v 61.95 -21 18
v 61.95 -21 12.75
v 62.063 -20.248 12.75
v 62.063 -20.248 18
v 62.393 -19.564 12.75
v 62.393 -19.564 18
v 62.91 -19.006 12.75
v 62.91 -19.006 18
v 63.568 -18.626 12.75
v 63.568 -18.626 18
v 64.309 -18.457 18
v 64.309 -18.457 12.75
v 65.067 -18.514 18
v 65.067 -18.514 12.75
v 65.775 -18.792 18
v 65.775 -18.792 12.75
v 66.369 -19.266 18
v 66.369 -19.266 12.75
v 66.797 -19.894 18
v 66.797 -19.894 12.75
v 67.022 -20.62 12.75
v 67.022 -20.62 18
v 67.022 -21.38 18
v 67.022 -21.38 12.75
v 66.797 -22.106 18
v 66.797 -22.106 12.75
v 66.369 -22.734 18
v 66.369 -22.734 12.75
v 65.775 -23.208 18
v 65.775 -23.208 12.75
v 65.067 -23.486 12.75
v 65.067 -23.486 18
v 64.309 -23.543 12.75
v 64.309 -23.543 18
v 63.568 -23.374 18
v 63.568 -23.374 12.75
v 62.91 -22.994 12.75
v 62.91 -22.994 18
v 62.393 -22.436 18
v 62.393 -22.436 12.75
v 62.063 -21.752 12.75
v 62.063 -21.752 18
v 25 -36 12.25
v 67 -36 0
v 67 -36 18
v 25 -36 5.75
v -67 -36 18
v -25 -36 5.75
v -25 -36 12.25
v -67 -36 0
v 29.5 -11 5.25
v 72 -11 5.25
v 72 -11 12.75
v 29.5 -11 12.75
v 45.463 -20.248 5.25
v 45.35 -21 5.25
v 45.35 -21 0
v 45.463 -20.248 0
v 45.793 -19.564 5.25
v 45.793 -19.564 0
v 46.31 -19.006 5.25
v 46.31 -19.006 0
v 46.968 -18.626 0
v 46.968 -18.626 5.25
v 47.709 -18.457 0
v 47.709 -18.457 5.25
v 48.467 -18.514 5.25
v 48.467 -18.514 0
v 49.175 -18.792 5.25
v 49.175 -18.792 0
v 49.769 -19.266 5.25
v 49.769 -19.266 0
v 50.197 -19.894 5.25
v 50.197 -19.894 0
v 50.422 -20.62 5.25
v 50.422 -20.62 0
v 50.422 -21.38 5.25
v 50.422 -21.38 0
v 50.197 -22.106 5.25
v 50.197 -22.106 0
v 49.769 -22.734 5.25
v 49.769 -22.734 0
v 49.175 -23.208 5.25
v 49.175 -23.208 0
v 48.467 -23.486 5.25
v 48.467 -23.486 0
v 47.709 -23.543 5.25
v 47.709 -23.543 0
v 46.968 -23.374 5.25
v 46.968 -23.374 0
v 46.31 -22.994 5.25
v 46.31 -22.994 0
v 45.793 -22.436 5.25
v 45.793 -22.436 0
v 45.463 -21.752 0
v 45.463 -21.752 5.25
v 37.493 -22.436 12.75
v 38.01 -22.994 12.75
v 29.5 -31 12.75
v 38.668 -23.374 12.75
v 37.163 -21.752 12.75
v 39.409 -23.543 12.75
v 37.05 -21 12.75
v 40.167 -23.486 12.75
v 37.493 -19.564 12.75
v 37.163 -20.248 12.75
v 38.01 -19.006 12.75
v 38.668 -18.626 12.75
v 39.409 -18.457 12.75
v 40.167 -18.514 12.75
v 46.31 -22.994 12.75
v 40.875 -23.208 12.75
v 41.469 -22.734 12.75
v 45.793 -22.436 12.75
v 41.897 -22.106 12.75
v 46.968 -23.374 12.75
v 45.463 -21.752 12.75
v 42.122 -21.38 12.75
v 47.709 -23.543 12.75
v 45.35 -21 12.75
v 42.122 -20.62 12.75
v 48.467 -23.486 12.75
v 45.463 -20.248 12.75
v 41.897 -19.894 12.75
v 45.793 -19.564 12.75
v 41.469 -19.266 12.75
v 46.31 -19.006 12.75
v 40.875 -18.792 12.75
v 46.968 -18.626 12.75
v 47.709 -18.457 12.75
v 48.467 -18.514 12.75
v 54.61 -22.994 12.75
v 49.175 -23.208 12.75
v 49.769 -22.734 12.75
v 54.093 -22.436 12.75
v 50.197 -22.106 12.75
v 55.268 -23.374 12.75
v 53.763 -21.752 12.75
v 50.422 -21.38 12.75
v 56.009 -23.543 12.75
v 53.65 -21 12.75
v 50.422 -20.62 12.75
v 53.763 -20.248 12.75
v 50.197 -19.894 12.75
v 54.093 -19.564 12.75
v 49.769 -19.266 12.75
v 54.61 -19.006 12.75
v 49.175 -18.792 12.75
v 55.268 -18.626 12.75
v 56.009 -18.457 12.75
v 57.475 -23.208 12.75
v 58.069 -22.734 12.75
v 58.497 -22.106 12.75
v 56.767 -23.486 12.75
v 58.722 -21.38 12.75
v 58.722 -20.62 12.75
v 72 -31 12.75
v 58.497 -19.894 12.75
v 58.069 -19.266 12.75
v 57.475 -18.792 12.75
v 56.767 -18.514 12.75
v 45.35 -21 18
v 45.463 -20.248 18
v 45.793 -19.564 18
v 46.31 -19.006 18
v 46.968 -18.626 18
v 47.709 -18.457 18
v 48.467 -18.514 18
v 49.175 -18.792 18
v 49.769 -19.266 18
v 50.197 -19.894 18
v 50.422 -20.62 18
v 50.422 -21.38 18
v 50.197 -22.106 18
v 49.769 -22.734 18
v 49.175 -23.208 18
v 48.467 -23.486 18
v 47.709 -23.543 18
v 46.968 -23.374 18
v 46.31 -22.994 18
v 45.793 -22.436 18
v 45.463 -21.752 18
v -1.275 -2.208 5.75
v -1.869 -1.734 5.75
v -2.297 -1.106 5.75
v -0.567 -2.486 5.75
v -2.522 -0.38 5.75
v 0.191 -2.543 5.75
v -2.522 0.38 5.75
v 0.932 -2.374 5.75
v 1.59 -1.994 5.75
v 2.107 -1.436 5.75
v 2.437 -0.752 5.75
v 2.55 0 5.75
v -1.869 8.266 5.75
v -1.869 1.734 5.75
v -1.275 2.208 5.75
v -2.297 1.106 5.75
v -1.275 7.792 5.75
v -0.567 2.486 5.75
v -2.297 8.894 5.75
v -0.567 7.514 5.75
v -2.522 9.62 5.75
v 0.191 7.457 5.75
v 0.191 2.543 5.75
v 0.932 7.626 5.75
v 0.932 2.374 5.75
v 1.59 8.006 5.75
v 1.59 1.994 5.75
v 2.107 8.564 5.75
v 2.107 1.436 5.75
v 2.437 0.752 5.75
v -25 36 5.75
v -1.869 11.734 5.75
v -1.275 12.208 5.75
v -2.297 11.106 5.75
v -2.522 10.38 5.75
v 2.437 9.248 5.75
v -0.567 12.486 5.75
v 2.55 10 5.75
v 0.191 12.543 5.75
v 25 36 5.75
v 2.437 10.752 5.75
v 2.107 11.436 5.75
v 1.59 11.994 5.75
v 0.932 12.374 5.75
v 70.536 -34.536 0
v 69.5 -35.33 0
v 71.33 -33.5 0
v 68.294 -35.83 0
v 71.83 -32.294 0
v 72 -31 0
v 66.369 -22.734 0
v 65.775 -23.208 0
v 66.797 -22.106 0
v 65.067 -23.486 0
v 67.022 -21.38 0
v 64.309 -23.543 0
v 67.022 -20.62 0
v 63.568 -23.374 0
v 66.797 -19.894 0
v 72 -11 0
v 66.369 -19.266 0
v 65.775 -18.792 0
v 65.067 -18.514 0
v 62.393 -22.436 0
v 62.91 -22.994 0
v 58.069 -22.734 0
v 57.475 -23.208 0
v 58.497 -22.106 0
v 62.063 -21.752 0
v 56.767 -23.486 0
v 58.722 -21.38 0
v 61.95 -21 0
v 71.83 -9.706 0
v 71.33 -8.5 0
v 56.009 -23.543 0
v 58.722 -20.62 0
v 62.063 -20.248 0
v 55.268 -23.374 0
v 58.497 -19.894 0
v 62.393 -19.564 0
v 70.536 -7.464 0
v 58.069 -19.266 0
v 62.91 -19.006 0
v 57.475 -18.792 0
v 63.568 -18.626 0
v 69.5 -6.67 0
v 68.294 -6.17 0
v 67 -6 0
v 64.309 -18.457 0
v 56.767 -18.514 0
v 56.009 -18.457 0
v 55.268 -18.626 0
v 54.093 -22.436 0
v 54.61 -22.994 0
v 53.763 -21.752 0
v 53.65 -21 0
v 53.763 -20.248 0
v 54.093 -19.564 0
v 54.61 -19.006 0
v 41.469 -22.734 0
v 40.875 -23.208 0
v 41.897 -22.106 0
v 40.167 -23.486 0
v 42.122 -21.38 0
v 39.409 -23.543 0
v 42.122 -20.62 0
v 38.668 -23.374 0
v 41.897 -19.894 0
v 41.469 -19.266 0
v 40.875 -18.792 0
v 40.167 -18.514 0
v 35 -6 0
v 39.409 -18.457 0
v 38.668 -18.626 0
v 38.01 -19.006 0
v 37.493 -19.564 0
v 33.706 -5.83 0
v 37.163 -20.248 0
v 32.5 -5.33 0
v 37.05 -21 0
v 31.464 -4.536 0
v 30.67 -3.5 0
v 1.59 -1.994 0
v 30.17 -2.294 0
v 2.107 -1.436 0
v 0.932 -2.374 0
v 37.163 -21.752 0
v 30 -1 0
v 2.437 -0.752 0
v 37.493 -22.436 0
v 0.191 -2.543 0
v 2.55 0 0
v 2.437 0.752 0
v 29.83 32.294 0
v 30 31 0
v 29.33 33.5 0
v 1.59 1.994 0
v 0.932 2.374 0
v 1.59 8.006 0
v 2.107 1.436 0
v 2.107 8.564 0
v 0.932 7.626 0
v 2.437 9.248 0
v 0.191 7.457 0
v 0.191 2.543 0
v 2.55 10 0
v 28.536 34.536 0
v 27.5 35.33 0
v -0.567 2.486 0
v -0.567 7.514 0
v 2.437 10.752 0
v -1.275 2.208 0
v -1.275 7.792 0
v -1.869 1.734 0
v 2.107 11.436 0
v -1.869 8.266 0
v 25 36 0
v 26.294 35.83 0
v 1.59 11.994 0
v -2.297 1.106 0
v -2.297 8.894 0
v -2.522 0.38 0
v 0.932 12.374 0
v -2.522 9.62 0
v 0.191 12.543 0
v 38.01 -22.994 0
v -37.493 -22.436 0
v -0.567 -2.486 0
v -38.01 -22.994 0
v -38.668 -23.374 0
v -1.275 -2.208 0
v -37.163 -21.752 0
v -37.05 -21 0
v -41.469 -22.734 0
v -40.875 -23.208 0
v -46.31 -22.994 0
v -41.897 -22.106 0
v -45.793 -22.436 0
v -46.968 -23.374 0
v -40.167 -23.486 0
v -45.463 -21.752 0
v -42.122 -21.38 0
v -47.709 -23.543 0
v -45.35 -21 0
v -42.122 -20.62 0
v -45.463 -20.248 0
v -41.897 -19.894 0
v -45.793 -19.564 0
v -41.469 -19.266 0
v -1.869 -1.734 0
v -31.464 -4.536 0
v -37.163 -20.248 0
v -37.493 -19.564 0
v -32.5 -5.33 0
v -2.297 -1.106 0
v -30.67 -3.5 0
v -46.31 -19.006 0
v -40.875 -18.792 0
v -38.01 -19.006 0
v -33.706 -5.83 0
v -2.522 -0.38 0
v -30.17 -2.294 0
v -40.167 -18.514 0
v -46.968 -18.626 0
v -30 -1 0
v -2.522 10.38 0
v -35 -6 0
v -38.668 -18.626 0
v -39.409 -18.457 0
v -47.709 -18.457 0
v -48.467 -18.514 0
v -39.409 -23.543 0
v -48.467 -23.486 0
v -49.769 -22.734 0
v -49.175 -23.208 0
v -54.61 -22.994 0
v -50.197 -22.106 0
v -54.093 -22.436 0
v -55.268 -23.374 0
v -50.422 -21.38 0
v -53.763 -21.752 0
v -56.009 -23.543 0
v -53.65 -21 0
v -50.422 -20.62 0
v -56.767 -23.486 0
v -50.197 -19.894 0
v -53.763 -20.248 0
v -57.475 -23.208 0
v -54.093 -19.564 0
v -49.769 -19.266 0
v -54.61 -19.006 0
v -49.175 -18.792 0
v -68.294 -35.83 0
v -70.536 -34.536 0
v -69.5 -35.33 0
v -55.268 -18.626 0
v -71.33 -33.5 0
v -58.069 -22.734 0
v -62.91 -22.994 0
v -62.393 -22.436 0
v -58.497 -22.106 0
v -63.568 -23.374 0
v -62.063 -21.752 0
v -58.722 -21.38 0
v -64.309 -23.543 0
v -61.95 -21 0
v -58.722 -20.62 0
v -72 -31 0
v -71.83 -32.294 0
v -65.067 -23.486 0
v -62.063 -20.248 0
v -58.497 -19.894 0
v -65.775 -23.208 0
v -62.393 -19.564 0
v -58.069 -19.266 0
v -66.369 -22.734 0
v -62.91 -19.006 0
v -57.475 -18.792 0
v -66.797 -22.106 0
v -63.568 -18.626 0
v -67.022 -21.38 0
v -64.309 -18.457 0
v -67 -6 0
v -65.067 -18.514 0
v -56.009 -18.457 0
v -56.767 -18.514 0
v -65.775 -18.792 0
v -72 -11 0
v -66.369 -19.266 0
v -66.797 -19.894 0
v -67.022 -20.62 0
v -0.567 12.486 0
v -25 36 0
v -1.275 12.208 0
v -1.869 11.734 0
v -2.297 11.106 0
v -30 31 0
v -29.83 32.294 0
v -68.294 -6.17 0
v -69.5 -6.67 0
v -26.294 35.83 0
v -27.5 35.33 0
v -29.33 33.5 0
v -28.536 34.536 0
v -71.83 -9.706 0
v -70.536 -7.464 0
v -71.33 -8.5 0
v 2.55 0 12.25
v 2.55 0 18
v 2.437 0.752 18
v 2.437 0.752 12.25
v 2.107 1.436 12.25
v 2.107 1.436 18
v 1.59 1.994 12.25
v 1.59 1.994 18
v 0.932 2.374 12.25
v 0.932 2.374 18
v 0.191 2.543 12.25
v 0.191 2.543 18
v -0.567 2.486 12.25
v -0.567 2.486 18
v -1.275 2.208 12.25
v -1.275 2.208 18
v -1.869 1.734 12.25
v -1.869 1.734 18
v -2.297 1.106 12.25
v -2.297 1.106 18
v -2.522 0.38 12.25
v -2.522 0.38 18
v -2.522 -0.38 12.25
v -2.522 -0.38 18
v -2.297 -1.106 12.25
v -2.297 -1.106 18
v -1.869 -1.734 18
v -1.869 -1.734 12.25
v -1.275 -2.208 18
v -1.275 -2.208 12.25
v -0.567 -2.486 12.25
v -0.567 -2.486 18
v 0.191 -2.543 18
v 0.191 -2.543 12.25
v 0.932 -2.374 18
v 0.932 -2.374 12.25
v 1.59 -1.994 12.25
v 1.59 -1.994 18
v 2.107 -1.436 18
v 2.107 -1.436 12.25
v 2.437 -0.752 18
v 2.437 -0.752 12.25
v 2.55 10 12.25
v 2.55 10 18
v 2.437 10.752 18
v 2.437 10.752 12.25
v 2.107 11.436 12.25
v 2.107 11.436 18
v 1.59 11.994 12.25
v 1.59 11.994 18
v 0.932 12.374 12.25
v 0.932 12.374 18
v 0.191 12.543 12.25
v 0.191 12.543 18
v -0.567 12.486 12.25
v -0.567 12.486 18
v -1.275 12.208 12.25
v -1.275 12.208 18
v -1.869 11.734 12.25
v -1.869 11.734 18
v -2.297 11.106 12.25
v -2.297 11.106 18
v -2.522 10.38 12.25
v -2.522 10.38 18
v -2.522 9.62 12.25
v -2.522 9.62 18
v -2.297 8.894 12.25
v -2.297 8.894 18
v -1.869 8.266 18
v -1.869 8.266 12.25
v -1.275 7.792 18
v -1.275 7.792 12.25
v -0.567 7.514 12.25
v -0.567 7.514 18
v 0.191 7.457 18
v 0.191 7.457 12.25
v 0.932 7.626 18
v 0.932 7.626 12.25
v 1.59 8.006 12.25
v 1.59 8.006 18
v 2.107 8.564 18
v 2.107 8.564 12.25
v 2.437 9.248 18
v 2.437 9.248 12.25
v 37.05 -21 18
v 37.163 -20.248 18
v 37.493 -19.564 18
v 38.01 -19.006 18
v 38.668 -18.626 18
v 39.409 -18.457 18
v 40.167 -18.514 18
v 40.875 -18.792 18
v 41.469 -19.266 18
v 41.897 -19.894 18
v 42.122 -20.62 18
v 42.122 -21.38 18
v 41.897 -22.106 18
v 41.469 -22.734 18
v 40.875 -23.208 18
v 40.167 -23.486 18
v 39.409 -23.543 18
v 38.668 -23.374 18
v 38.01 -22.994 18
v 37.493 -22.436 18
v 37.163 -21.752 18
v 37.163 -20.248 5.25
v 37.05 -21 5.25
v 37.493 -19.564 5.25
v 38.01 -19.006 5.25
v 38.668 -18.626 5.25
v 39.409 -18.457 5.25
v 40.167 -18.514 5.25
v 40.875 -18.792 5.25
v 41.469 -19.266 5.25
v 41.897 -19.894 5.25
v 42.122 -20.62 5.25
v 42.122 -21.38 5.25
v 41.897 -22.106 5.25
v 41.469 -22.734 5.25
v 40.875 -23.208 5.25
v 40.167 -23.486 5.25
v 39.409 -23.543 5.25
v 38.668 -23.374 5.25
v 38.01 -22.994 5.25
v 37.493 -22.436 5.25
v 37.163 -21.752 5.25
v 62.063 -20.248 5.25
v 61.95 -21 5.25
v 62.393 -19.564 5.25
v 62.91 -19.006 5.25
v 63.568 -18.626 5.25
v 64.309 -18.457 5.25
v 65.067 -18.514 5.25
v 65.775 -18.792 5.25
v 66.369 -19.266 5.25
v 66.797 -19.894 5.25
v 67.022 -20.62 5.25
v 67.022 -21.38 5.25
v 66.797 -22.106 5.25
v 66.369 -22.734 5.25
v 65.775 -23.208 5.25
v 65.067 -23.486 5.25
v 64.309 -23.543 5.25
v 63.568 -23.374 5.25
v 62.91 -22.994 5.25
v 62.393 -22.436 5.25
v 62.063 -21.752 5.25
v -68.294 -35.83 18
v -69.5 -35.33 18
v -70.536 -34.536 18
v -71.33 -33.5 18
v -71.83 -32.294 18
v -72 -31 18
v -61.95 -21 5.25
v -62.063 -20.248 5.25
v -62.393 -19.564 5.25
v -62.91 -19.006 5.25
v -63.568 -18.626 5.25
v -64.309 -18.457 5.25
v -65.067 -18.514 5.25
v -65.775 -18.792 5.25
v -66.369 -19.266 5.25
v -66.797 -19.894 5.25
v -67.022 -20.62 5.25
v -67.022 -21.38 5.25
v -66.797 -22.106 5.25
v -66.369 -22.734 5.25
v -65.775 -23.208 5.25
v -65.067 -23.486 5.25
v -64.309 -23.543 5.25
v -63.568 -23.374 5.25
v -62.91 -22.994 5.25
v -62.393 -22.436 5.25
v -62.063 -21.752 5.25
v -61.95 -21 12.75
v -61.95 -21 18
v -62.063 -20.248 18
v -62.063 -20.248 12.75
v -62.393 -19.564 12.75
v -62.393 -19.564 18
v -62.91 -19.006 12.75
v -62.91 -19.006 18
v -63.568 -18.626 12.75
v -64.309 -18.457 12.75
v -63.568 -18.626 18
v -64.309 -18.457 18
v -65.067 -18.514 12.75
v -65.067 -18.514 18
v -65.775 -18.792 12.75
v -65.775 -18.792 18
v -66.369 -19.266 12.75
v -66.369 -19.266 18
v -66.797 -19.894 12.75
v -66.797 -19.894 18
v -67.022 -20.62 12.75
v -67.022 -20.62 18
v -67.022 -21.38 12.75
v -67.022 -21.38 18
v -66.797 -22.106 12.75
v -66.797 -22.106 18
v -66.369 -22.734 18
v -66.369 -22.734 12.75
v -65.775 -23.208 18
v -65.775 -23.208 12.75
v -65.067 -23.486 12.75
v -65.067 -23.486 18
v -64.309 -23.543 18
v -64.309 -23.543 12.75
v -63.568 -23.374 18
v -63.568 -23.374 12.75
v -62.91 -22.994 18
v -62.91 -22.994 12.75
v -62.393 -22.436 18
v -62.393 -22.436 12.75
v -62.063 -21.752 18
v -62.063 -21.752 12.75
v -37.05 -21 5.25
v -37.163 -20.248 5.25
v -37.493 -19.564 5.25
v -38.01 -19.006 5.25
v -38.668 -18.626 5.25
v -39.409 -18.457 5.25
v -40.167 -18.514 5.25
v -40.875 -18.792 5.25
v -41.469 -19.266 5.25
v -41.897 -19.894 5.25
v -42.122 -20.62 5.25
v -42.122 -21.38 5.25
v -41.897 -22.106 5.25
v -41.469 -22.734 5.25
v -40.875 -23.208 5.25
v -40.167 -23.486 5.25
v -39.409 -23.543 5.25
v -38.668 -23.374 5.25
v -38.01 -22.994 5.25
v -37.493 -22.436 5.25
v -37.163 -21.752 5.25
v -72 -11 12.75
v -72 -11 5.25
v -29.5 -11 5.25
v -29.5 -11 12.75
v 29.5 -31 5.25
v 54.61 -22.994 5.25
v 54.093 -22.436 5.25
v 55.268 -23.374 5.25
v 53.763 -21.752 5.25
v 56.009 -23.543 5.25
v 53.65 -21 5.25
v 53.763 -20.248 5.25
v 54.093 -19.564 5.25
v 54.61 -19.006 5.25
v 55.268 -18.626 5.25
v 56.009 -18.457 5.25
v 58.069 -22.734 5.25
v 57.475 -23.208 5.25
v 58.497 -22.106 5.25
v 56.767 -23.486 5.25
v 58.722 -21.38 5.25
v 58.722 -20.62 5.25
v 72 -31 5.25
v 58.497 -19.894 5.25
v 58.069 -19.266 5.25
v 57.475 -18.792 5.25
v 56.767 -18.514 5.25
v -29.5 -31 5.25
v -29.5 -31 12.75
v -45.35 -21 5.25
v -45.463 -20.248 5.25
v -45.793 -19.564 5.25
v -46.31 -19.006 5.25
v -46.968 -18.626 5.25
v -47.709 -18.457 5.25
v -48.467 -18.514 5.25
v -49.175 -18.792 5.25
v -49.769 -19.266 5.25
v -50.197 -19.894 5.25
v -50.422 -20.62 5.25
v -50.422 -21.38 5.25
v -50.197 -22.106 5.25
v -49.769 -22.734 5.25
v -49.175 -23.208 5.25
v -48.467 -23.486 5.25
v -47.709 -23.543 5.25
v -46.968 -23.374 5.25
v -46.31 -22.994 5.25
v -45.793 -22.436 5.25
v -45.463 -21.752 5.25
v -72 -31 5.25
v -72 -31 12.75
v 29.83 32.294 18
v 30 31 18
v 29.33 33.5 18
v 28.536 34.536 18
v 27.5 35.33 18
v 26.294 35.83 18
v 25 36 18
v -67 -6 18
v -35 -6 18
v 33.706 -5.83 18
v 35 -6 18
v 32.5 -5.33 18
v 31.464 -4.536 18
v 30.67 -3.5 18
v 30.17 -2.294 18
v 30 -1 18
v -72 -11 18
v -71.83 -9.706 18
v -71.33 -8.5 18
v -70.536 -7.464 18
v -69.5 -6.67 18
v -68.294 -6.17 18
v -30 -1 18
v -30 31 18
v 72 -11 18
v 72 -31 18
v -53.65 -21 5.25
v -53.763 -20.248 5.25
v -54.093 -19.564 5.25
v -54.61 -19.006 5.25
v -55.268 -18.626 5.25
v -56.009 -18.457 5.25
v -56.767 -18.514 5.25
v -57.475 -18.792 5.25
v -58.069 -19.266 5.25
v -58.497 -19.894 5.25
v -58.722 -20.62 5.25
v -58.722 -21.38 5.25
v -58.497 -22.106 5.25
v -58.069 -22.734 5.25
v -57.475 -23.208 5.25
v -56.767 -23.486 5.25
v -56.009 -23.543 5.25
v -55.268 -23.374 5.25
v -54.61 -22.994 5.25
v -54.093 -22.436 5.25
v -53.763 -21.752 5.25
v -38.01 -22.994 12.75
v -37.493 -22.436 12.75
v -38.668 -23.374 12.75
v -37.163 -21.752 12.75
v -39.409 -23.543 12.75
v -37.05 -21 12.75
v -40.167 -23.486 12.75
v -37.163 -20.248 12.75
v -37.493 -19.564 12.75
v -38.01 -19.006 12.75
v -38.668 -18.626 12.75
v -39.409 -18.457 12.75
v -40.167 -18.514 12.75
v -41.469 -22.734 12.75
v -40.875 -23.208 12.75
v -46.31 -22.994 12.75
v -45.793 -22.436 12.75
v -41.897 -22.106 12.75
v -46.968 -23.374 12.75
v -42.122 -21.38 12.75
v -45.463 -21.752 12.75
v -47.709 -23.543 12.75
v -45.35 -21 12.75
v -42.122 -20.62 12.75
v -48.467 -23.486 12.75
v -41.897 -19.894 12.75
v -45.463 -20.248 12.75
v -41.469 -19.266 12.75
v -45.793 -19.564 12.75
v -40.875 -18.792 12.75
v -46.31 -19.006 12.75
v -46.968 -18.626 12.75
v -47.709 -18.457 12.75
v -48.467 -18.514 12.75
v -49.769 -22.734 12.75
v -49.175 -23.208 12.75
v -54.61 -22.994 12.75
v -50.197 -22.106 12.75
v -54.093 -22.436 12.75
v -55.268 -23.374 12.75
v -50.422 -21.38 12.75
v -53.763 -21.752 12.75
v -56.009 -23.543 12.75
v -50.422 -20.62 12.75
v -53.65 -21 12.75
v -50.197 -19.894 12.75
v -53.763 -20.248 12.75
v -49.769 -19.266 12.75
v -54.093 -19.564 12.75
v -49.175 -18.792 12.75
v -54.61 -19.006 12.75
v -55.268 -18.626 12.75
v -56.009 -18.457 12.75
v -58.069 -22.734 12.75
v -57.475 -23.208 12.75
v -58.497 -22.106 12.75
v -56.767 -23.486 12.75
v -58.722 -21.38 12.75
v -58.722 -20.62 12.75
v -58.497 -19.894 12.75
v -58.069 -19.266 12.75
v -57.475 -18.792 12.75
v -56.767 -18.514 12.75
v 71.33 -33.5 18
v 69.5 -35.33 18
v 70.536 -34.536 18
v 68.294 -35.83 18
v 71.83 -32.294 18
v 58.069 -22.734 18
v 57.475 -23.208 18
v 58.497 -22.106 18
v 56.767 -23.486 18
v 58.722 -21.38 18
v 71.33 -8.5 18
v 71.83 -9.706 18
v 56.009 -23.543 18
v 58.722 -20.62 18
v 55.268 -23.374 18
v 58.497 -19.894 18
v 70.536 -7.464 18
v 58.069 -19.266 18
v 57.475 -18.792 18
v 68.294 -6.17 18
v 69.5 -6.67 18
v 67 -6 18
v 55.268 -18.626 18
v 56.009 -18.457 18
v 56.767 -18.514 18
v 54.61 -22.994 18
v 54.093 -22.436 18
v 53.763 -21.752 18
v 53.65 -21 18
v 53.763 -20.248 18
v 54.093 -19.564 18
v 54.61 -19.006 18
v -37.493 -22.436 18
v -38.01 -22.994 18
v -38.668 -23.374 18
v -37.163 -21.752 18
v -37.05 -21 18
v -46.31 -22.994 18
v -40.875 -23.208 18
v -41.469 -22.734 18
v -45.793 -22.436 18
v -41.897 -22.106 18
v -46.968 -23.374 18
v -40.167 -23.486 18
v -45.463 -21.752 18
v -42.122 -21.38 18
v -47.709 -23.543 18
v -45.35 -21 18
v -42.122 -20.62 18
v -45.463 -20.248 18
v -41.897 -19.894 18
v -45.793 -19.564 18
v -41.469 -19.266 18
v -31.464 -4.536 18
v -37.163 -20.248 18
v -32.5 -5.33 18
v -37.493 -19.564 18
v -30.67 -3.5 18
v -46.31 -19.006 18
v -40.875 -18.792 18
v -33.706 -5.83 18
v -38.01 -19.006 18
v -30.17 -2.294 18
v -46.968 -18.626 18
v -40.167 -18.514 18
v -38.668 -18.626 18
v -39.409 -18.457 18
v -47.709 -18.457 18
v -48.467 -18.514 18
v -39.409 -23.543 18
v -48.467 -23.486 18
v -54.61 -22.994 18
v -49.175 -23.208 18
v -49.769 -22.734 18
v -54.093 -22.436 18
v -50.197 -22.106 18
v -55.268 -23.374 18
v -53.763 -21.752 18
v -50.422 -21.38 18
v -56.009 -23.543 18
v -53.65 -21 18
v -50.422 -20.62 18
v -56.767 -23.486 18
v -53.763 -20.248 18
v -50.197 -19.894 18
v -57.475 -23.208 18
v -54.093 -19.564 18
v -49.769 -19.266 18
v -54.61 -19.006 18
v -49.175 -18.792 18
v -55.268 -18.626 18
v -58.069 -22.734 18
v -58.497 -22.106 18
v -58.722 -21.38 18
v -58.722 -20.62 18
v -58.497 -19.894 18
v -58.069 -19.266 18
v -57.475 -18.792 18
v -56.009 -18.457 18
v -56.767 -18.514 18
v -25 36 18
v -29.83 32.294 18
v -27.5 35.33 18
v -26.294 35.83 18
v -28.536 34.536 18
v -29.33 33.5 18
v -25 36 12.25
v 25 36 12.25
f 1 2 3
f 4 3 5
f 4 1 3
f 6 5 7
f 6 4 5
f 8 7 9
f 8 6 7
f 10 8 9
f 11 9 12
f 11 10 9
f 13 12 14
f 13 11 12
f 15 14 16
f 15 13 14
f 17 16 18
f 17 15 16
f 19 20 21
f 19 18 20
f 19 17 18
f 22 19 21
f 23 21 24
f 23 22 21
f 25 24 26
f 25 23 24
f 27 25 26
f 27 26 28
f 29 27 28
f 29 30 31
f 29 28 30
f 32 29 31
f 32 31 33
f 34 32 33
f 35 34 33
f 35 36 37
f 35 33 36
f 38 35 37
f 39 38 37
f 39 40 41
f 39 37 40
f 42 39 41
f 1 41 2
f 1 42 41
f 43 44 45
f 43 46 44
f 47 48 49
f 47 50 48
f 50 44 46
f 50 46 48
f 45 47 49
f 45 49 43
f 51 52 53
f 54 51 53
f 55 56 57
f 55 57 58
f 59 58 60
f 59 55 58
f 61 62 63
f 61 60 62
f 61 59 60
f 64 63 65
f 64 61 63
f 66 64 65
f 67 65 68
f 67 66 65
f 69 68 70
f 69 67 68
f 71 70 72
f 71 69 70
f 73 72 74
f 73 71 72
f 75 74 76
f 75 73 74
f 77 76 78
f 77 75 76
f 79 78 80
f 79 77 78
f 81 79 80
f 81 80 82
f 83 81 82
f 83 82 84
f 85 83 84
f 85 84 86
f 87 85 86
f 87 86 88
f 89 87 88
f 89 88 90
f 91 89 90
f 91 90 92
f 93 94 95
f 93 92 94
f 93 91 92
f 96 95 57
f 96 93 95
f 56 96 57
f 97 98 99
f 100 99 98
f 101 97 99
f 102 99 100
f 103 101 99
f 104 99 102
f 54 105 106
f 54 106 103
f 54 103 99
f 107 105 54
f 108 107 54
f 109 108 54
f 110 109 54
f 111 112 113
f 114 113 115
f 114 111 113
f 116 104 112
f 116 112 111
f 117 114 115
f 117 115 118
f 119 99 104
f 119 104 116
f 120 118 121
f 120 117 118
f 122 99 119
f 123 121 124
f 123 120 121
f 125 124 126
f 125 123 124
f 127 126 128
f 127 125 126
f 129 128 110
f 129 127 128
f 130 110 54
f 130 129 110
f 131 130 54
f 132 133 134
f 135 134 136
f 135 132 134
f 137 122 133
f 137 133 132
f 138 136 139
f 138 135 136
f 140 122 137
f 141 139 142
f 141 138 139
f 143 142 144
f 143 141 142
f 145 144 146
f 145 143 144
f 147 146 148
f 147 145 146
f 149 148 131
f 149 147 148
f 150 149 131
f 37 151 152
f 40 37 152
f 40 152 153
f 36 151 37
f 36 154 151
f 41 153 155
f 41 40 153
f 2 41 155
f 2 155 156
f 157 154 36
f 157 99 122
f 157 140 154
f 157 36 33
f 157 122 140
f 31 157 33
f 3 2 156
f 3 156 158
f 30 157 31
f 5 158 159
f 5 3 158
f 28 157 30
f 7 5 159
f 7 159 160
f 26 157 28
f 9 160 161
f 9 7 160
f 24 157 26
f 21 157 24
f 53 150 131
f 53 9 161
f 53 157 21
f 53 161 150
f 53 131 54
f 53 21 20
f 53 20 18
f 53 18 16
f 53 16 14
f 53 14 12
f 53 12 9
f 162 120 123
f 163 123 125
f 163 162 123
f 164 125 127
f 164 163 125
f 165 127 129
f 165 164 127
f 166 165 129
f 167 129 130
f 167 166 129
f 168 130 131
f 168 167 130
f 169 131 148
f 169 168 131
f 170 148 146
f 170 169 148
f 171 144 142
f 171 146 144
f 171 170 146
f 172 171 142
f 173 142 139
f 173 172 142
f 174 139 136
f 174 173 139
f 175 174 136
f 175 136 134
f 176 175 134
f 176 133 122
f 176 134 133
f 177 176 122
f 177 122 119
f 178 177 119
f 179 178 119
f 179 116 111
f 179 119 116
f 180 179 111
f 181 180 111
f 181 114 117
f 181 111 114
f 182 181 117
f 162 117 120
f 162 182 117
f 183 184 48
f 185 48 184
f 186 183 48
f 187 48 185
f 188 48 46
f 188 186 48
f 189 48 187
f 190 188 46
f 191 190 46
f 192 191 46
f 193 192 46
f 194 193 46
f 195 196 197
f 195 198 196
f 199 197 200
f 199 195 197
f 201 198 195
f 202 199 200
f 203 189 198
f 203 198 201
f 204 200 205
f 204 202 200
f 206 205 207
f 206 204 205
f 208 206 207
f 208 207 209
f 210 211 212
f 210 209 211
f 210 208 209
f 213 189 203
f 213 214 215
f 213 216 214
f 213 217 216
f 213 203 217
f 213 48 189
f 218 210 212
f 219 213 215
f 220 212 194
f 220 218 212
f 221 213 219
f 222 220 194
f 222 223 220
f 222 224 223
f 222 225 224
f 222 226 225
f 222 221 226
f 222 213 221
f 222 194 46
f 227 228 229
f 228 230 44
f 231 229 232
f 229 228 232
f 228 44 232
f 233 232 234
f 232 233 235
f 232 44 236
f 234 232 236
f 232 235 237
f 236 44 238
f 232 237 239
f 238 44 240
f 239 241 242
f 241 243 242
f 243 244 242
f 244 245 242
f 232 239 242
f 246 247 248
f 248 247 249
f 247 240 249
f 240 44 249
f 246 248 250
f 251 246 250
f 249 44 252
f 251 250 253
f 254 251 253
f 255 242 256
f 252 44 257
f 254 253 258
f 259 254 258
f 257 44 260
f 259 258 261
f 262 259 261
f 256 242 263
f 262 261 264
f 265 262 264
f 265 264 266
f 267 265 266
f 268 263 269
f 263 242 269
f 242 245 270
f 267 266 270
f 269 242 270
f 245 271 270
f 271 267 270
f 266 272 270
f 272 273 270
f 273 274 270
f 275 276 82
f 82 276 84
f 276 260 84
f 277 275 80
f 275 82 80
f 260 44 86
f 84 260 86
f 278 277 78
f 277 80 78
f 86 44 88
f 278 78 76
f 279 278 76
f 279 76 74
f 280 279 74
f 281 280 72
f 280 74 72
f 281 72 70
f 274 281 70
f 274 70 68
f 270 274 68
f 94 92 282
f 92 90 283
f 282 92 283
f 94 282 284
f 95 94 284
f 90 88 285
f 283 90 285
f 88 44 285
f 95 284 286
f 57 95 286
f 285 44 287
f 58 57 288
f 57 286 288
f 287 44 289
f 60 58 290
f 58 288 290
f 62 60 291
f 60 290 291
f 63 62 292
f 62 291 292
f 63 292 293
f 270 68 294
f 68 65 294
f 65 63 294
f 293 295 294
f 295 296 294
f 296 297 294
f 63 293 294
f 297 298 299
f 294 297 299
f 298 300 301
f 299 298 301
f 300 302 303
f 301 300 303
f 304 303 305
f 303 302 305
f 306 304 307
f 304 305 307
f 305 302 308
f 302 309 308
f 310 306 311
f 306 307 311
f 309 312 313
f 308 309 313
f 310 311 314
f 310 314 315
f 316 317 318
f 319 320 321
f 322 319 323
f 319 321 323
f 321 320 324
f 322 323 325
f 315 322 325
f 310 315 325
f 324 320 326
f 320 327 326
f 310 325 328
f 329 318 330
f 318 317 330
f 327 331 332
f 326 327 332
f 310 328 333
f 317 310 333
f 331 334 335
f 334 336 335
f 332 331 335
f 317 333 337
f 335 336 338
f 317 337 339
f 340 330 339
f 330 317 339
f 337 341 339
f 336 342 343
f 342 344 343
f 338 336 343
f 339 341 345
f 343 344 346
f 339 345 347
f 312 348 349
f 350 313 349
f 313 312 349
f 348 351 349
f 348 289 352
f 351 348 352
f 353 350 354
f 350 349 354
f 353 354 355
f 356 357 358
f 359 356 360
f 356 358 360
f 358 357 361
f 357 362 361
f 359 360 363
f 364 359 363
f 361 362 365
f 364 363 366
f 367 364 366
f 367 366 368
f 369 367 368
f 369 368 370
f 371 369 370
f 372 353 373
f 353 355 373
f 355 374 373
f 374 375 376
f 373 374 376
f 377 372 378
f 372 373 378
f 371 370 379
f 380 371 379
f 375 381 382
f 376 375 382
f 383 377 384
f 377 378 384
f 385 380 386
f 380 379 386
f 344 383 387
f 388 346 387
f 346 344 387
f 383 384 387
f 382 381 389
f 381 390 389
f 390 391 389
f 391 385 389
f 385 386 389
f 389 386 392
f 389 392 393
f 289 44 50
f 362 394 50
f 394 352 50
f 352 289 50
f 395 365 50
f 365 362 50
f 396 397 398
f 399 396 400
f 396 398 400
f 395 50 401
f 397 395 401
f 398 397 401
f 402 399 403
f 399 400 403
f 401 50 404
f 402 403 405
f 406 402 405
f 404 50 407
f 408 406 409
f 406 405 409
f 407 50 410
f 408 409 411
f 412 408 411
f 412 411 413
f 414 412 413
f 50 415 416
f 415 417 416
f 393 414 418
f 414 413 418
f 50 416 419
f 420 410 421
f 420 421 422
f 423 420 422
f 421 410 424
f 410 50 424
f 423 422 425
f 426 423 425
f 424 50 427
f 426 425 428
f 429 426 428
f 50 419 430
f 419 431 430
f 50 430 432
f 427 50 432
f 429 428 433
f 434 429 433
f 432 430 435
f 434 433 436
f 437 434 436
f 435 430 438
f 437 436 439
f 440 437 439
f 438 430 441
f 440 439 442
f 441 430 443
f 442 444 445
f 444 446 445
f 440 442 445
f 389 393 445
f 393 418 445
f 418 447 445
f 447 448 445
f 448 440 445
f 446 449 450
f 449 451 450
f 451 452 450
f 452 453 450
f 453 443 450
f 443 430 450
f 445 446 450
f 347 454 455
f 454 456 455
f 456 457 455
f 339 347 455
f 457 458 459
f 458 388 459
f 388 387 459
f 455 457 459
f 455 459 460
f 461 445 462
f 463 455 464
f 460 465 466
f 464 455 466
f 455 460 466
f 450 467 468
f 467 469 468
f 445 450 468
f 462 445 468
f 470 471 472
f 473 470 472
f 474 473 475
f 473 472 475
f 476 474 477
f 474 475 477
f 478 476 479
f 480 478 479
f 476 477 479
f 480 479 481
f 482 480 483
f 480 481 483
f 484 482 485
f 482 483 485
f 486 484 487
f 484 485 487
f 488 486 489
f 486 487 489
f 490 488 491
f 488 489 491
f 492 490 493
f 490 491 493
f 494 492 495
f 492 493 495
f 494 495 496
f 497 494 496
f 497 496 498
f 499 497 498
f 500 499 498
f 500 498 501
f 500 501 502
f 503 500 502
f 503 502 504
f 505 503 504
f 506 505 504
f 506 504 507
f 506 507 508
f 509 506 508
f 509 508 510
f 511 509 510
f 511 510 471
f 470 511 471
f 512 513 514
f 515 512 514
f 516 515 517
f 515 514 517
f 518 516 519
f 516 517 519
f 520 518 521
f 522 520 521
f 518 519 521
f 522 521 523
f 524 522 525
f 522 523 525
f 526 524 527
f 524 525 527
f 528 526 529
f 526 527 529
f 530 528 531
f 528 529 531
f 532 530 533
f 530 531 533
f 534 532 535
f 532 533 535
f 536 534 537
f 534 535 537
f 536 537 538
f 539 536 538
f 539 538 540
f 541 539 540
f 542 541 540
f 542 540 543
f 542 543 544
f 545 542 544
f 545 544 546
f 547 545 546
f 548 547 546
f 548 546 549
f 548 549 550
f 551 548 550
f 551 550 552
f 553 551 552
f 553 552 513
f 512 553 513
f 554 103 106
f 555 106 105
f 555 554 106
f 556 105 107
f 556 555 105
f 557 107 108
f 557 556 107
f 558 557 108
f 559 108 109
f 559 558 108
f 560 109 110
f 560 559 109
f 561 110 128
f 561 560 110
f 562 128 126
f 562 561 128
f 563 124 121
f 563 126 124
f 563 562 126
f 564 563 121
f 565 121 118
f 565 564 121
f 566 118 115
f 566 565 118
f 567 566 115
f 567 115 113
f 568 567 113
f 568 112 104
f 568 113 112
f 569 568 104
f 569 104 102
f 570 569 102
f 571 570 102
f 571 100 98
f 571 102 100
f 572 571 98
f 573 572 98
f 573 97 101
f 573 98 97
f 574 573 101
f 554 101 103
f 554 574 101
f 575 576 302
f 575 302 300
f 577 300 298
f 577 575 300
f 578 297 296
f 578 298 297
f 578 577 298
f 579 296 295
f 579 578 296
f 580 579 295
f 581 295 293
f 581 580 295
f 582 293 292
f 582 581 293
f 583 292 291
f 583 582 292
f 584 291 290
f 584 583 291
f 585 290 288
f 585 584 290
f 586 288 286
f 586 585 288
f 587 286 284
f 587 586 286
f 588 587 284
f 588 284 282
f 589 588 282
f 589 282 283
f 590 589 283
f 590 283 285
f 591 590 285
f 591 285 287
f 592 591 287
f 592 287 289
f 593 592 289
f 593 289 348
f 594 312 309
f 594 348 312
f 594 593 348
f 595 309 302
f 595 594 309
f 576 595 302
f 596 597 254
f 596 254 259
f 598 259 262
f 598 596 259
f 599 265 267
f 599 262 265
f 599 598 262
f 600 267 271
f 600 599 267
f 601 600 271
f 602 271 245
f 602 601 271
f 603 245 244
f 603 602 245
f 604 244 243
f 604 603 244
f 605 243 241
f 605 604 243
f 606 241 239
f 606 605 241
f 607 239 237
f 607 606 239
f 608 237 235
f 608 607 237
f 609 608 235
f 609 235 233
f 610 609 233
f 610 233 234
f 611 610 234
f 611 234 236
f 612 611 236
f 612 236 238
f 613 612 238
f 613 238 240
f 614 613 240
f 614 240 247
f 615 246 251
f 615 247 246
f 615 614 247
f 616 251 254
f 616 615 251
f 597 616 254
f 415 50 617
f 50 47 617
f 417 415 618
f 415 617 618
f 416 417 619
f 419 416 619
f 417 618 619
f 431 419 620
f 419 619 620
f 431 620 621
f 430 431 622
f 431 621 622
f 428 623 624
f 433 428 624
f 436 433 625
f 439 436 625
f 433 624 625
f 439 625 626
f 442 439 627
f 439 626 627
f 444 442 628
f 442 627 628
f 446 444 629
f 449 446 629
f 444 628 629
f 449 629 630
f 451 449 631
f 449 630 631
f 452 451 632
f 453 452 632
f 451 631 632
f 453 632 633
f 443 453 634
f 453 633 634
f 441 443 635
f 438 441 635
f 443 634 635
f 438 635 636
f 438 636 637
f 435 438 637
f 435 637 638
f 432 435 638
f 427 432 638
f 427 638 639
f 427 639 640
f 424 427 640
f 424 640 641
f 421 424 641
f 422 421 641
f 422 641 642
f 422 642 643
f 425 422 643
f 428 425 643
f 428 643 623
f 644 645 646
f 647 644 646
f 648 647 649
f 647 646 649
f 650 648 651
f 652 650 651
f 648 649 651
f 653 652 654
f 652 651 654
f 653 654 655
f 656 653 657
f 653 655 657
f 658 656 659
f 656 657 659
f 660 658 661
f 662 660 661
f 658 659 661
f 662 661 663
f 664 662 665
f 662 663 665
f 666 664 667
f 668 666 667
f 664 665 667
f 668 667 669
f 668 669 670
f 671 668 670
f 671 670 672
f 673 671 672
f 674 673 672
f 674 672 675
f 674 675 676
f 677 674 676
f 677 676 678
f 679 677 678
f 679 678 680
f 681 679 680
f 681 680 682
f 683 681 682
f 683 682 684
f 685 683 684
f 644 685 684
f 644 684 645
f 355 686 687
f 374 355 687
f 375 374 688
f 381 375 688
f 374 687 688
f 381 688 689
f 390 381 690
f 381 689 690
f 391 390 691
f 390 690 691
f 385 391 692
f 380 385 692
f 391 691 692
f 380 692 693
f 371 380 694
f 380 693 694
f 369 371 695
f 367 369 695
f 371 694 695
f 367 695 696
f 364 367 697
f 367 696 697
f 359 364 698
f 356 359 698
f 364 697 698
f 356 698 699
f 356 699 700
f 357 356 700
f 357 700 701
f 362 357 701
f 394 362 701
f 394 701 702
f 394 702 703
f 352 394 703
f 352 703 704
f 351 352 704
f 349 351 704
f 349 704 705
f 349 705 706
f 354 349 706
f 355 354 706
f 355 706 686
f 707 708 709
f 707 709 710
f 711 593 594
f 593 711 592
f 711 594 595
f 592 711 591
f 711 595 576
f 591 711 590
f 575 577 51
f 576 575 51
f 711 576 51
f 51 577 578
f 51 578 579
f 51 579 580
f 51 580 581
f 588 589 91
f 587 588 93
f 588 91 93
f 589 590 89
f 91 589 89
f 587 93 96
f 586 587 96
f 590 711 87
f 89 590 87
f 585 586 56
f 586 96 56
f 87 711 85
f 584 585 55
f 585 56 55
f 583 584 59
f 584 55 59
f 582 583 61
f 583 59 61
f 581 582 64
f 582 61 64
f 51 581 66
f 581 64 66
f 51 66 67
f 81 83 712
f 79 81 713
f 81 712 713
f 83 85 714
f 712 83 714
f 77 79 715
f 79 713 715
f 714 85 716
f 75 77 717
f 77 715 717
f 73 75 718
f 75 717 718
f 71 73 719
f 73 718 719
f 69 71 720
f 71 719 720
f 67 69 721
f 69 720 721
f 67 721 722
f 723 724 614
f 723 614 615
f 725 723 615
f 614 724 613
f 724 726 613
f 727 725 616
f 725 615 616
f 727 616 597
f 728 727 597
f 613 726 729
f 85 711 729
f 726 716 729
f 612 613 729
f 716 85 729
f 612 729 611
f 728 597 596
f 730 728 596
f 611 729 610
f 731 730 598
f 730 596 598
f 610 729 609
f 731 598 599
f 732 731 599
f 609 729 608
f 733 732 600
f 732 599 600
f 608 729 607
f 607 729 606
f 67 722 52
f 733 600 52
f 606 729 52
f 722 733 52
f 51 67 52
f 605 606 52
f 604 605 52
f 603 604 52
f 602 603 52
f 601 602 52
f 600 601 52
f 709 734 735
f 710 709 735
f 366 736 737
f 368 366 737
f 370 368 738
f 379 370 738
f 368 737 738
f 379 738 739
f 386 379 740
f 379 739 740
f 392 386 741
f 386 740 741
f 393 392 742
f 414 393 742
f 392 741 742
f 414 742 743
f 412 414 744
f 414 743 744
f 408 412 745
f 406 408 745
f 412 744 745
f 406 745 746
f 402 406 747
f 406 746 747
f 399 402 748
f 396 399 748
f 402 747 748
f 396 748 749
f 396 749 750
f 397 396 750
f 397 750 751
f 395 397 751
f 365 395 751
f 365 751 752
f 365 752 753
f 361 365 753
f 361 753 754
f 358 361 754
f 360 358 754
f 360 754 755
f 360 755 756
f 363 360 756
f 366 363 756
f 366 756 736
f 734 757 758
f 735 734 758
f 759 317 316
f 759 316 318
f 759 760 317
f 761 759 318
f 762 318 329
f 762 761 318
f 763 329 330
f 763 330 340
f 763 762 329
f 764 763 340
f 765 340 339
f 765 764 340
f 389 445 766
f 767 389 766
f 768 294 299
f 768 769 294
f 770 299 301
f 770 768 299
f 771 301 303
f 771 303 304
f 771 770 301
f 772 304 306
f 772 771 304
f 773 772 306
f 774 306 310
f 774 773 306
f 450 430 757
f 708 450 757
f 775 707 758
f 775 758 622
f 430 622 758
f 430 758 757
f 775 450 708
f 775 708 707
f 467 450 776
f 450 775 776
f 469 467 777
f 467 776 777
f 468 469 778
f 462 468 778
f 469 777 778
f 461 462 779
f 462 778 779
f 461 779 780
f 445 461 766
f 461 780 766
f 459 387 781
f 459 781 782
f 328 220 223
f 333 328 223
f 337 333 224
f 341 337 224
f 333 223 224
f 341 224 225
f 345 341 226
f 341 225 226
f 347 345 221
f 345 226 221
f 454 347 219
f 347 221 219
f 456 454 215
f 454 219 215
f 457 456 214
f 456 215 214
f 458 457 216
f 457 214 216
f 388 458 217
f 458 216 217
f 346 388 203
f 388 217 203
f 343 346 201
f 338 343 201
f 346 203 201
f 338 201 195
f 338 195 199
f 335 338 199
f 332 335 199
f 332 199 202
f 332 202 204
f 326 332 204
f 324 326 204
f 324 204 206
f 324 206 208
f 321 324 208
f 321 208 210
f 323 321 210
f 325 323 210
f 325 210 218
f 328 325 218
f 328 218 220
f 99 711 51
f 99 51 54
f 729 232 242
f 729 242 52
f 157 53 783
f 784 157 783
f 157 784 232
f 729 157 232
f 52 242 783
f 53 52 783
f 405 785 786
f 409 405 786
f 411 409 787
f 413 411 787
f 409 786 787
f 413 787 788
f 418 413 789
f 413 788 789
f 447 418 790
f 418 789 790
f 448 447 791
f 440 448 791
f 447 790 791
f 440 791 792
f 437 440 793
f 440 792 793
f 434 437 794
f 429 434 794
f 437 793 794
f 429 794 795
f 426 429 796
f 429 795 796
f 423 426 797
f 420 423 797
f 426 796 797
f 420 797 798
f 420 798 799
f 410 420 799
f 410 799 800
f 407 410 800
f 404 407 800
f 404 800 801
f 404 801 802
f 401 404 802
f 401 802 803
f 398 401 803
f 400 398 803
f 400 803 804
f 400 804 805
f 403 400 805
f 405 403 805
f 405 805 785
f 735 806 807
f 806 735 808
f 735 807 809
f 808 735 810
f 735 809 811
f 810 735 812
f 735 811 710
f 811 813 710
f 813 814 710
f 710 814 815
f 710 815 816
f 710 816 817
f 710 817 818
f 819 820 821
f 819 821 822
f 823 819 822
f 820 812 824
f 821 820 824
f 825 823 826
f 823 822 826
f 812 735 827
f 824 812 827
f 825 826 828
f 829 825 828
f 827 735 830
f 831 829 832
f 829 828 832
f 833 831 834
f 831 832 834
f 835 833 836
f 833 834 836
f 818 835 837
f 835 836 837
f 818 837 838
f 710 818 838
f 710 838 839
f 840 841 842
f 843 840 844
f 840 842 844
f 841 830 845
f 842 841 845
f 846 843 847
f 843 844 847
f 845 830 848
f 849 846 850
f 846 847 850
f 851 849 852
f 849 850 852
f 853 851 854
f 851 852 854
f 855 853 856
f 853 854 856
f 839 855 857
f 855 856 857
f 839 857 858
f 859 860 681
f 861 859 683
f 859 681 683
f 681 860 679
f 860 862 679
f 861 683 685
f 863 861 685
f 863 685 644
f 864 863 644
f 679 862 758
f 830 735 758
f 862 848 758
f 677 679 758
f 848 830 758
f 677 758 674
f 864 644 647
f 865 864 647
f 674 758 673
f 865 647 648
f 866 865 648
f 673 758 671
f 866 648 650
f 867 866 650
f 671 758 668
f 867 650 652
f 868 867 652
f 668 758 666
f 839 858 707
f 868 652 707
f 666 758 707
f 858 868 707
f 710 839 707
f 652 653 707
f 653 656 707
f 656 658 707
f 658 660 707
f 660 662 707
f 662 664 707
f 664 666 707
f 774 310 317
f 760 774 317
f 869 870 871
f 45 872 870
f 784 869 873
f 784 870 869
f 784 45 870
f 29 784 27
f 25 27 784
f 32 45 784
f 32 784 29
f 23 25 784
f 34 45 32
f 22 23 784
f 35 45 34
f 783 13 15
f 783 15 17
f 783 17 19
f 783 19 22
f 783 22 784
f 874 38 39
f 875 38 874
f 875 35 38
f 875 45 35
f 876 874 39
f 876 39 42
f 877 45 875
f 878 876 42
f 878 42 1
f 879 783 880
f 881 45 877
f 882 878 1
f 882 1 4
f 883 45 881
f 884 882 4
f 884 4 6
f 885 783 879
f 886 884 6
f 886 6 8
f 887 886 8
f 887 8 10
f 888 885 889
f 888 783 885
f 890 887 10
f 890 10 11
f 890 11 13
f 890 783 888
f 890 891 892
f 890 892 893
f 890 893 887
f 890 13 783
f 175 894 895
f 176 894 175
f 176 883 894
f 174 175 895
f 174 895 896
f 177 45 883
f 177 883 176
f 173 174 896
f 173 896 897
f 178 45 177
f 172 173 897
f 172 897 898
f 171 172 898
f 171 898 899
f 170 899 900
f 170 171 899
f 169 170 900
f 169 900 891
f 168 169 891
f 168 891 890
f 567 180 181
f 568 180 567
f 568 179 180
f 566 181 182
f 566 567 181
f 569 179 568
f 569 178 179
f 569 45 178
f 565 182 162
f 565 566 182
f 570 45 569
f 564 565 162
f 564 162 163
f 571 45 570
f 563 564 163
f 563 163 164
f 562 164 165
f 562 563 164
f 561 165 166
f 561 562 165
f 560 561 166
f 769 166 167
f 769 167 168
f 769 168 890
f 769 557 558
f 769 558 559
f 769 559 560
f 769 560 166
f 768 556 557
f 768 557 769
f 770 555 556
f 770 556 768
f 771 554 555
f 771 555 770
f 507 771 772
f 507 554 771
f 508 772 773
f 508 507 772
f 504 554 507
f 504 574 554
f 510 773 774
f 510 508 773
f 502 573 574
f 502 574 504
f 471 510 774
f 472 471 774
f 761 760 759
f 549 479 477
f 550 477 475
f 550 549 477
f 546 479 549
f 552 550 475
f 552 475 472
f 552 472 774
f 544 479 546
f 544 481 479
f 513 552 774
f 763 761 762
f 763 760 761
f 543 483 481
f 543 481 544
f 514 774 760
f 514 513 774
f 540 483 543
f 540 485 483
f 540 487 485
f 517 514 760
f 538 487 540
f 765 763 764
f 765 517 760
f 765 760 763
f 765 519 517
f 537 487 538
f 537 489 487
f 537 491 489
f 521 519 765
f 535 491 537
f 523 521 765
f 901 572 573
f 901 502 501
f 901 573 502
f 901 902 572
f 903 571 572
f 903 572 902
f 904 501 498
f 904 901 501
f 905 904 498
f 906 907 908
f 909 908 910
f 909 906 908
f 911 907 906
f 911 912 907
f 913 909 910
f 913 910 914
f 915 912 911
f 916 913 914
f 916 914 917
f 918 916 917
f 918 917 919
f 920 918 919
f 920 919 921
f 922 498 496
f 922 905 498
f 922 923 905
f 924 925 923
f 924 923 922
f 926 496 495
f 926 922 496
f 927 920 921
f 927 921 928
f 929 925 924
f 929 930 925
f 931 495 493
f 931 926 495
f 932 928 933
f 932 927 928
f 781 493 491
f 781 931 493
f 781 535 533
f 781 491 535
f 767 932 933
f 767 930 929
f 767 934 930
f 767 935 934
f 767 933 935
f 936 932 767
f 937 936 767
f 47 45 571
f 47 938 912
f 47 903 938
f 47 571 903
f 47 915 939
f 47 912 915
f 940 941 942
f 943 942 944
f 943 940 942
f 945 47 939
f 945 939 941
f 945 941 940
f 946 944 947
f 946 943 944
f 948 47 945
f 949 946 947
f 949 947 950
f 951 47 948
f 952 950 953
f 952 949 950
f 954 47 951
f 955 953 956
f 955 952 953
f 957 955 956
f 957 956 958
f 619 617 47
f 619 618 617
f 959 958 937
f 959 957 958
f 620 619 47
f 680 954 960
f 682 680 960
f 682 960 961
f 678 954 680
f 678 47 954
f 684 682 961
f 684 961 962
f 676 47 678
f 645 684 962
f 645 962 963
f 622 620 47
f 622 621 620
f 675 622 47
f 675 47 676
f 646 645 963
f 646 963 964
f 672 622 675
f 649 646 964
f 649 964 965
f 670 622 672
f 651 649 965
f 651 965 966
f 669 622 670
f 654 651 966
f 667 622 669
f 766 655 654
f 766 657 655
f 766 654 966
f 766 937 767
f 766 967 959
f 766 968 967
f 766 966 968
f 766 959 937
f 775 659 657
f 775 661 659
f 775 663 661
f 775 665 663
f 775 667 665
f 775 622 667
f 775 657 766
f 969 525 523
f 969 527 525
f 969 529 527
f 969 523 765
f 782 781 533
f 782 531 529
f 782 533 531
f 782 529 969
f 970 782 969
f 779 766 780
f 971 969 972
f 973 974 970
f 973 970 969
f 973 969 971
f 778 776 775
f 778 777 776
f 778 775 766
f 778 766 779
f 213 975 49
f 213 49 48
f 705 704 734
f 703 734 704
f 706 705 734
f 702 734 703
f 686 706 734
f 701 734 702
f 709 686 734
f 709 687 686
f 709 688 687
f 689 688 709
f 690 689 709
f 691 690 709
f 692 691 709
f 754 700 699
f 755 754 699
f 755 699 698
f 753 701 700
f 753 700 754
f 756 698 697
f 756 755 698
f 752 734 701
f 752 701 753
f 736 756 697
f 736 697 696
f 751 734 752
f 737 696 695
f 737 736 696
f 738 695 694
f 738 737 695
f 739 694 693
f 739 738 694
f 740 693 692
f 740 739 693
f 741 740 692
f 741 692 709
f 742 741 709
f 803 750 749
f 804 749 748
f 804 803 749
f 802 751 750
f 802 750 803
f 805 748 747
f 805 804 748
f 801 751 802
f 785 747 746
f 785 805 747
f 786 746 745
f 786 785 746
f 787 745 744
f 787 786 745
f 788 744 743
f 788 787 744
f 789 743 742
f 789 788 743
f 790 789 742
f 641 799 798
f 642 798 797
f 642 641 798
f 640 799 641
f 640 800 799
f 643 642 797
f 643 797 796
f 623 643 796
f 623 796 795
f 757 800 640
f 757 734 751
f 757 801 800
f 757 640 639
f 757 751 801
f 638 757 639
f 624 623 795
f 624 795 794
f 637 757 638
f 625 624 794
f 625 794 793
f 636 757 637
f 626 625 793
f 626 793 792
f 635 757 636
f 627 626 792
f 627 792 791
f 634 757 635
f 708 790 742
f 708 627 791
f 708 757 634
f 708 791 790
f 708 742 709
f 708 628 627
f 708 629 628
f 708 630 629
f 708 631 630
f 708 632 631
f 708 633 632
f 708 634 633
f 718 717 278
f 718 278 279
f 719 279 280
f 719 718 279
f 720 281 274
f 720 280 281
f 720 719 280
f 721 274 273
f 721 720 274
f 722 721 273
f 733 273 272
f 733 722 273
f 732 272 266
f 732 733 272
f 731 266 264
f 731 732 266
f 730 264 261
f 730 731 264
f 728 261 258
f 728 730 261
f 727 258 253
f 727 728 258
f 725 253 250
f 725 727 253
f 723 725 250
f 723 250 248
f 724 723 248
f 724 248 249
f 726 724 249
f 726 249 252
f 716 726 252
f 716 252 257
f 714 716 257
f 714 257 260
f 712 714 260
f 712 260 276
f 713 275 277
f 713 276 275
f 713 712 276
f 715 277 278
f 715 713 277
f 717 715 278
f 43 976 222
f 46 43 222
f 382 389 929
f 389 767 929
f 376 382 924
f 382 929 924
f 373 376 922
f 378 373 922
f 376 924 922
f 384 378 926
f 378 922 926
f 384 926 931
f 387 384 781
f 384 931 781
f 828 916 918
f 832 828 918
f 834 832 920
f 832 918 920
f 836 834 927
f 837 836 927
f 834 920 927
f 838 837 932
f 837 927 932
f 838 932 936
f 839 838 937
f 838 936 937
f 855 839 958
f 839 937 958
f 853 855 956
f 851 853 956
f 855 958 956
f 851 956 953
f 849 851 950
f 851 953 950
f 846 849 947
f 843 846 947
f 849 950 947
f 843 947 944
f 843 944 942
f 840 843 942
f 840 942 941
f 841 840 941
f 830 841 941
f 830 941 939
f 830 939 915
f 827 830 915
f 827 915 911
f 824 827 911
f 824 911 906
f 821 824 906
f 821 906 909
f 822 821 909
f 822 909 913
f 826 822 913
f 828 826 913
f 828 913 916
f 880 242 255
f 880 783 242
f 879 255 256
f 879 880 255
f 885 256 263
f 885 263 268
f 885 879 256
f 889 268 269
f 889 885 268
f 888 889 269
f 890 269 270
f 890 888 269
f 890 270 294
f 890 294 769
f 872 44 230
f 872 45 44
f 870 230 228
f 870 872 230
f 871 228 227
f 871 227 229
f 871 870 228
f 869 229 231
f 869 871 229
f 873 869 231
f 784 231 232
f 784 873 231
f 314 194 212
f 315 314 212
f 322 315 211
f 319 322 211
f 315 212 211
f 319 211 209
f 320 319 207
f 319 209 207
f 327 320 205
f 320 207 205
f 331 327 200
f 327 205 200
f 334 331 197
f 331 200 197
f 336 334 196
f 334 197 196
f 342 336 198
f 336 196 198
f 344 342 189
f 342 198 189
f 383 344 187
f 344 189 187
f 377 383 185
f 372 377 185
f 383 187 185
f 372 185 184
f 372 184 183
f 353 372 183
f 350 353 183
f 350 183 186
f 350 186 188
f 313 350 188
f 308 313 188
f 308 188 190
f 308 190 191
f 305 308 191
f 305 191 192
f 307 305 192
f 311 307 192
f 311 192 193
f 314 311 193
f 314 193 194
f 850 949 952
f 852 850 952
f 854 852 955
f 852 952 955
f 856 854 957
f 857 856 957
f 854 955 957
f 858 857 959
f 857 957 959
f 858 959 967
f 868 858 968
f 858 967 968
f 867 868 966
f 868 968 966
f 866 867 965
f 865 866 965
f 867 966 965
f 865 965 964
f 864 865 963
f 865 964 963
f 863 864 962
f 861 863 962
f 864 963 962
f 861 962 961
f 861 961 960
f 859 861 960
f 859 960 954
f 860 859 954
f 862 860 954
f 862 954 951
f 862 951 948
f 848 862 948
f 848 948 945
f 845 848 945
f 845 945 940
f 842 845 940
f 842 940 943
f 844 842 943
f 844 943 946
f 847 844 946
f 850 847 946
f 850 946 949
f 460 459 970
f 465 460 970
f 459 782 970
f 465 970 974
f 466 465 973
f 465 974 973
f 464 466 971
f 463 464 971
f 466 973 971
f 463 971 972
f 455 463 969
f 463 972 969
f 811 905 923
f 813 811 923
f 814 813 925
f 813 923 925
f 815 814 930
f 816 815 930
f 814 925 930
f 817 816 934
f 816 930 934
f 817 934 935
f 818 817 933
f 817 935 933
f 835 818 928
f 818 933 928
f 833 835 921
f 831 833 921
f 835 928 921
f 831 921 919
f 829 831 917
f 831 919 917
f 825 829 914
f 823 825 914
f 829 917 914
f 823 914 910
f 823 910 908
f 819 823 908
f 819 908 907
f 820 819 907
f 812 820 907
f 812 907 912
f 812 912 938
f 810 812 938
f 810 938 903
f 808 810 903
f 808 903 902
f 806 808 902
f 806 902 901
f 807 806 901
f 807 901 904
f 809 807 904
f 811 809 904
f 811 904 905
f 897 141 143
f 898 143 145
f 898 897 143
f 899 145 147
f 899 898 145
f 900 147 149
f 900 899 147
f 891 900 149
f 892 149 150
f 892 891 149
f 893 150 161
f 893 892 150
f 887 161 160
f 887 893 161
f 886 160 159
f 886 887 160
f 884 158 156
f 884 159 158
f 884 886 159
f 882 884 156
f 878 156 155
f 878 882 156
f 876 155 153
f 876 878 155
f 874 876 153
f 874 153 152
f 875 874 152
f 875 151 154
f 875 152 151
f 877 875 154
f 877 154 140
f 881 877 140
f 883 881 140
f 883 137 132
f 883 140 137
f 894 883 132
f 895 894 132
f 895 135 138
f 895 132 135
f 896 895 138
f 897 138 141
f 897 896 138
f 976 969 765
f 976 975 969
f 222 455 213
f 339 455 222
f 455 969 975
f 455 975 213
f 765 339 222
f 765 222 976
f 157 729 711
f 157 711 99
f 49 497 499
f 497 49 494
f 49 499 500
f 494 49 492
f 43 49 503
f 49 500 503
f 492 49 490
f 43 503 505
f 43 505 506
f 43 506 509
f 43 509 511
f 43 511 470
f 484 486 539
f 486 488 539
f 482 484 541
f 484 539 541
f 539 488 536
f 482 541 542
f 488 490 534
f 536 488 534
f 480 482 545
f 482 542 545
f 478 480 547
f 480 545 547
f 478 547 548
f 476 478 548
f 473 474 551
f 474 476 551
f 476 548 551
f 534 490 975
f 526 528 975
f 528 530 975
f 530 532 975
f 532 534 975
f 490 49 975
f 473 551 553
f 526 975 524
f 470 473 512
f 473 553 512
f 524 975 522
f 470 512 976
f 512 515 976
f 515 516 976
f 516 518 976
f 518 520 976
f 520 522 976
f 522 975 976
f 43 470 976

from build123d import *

# Parameters (mm, degrees)
SKETCH1_W           = 60
SKETCH1_H           = 72
BOSS_EXTRUDE1_DEPTH = 18
SKETCH2_W           = 50
SKETCH2_H           = 6.5
CUT_EXTRUDE1_DEPTH  = 81.049984385
SKETCH3_W           = 18
SKETCH3_H           = 30
BOSS_EXTRUDE2_DEPTH = 42
SKETCH4_W           = 7.5
SKETCH4_H           = 20
CUT_EXTRUDE2_DEPTH  = 42.5
SKETCH5_R           = 2.55
CUT_EXTRUDE3_DEPTH  = 35
FILLET1_R           = 5
SKETCH6_R           = 2.55
CUT_EXTRUDE4_DEPTH  = 35


with BuildPart() as part:
    # Sketch1 → Boss-Extrude1 (new body)
    with BuildSketch(Plane.XY):
        Rectangle(SKETCH1_W, SKETCH1_H)
    extrude(amount=BOSS_EXTRUDE1_DEPTH)

    # Sketch2 → Cut-Extrude1 (cut, through all)
    with BuildSketch(Plane(origin=(0, 36, 0), x_dir=(1, 0, 0), z_dir=(0, 1, 0))):
        with Locations((0, -9)):
            Rectangle(SKETCH2_W, SKETCH2_H)
    extrude(amount=-CUT_EXTRUDE1_DEPTH, mode=Mode.SUBTRACT)

    # Sketch3 → Boss-Extrude2 (add)
    with BuildSketch(Plane.ZY.offset(30)):
        with Locations((9, -21)):
            Rectangle(SKETCH3_W, SKETCH3_H)
    boss_extrude2 = extrude(amount=BOSS_EXTRUDE2_DEPTH)

    # Sketch4 → Cut-Extrude2 (cut)
    with BuildSketch(Plane.ZY.offset(72)):
        with Locations((9, -21)):
            Rectangle(SKETCH4_W, SKETCH4_H)
    cut_extrude2 = extrude(amount=-CUT_EXTRUDE2_DEPTH, mode=Mode.SUBTRACT)

    # Sketch5 → Cut-Extrude3 (cut)
    with BuildSketch(Plane.XY.offset(18)):
        with Locations((-64.5, -21)):
            Circle(SKETCH5_R)
        with Locations((-56.2, -21)):
            Circle(SKETCH5_R)
        with Locations((-47.9, -21)):
            Circle(SKETCH5_R)
        with Locations((-39.6, -21)):
            Circle(SKETCH5_R)
    cut_extrude3 = extrude(amount=-CUT_EXTRUDE3_DEPTH, mode=Mode.SUBTRACT)

    # Mirror1: Boss-Extrude2, Cut-Extrude2, Cut-Extrude3 across plane
    add(boss_extrude2.mirror(Plane(origin=(0, 0, 0), x_dir=(0, 0, 1), z_dir=(1, 0, 0))))
    add(cut_extrude2.mirror(Plane(origin=(0, 0, 0), x_dir=(0, 0, 1), z_dir=(1, 0, 0))), mode=Mode.SUBTRACT)
    add(cut_extrude3.mirror(Plane(origin=(0, 0, 0), x_dir=(0, 0, 1), z_dir=(1, 0, 0))), mode=Mode.SUBTRACT)

    # Fillet1
    fillet1_edges = [part.edges().sort_by_distance(p)[0] for p in [
        (-30, -6, 9),
        (-72, -36, 9),
        (-72, -6, 9),
        (-30, 36, 9),
        (30, 36, 9),
        (72, -6, 9),
        (72, -36, 9),
        (30, -6, 9),
    ]]
    fillet(fillet1_edges, radius=FILLET1_R - 0.0001)  # a hair under: the kernel refuses the full size

    # Sketch6 → Cut-Extrude4 (cut)
    with BuildSketch(Plane.XY.offset(18)):
        Circle(SKETCH6_R)
        with Locations((0, 10)):
            Circle(SKETCH6_R)
    extrude(amount=-CUT_EXTRUDE4_DEPTH, mode=Mode.SUBTRACT)


solid = part.part
